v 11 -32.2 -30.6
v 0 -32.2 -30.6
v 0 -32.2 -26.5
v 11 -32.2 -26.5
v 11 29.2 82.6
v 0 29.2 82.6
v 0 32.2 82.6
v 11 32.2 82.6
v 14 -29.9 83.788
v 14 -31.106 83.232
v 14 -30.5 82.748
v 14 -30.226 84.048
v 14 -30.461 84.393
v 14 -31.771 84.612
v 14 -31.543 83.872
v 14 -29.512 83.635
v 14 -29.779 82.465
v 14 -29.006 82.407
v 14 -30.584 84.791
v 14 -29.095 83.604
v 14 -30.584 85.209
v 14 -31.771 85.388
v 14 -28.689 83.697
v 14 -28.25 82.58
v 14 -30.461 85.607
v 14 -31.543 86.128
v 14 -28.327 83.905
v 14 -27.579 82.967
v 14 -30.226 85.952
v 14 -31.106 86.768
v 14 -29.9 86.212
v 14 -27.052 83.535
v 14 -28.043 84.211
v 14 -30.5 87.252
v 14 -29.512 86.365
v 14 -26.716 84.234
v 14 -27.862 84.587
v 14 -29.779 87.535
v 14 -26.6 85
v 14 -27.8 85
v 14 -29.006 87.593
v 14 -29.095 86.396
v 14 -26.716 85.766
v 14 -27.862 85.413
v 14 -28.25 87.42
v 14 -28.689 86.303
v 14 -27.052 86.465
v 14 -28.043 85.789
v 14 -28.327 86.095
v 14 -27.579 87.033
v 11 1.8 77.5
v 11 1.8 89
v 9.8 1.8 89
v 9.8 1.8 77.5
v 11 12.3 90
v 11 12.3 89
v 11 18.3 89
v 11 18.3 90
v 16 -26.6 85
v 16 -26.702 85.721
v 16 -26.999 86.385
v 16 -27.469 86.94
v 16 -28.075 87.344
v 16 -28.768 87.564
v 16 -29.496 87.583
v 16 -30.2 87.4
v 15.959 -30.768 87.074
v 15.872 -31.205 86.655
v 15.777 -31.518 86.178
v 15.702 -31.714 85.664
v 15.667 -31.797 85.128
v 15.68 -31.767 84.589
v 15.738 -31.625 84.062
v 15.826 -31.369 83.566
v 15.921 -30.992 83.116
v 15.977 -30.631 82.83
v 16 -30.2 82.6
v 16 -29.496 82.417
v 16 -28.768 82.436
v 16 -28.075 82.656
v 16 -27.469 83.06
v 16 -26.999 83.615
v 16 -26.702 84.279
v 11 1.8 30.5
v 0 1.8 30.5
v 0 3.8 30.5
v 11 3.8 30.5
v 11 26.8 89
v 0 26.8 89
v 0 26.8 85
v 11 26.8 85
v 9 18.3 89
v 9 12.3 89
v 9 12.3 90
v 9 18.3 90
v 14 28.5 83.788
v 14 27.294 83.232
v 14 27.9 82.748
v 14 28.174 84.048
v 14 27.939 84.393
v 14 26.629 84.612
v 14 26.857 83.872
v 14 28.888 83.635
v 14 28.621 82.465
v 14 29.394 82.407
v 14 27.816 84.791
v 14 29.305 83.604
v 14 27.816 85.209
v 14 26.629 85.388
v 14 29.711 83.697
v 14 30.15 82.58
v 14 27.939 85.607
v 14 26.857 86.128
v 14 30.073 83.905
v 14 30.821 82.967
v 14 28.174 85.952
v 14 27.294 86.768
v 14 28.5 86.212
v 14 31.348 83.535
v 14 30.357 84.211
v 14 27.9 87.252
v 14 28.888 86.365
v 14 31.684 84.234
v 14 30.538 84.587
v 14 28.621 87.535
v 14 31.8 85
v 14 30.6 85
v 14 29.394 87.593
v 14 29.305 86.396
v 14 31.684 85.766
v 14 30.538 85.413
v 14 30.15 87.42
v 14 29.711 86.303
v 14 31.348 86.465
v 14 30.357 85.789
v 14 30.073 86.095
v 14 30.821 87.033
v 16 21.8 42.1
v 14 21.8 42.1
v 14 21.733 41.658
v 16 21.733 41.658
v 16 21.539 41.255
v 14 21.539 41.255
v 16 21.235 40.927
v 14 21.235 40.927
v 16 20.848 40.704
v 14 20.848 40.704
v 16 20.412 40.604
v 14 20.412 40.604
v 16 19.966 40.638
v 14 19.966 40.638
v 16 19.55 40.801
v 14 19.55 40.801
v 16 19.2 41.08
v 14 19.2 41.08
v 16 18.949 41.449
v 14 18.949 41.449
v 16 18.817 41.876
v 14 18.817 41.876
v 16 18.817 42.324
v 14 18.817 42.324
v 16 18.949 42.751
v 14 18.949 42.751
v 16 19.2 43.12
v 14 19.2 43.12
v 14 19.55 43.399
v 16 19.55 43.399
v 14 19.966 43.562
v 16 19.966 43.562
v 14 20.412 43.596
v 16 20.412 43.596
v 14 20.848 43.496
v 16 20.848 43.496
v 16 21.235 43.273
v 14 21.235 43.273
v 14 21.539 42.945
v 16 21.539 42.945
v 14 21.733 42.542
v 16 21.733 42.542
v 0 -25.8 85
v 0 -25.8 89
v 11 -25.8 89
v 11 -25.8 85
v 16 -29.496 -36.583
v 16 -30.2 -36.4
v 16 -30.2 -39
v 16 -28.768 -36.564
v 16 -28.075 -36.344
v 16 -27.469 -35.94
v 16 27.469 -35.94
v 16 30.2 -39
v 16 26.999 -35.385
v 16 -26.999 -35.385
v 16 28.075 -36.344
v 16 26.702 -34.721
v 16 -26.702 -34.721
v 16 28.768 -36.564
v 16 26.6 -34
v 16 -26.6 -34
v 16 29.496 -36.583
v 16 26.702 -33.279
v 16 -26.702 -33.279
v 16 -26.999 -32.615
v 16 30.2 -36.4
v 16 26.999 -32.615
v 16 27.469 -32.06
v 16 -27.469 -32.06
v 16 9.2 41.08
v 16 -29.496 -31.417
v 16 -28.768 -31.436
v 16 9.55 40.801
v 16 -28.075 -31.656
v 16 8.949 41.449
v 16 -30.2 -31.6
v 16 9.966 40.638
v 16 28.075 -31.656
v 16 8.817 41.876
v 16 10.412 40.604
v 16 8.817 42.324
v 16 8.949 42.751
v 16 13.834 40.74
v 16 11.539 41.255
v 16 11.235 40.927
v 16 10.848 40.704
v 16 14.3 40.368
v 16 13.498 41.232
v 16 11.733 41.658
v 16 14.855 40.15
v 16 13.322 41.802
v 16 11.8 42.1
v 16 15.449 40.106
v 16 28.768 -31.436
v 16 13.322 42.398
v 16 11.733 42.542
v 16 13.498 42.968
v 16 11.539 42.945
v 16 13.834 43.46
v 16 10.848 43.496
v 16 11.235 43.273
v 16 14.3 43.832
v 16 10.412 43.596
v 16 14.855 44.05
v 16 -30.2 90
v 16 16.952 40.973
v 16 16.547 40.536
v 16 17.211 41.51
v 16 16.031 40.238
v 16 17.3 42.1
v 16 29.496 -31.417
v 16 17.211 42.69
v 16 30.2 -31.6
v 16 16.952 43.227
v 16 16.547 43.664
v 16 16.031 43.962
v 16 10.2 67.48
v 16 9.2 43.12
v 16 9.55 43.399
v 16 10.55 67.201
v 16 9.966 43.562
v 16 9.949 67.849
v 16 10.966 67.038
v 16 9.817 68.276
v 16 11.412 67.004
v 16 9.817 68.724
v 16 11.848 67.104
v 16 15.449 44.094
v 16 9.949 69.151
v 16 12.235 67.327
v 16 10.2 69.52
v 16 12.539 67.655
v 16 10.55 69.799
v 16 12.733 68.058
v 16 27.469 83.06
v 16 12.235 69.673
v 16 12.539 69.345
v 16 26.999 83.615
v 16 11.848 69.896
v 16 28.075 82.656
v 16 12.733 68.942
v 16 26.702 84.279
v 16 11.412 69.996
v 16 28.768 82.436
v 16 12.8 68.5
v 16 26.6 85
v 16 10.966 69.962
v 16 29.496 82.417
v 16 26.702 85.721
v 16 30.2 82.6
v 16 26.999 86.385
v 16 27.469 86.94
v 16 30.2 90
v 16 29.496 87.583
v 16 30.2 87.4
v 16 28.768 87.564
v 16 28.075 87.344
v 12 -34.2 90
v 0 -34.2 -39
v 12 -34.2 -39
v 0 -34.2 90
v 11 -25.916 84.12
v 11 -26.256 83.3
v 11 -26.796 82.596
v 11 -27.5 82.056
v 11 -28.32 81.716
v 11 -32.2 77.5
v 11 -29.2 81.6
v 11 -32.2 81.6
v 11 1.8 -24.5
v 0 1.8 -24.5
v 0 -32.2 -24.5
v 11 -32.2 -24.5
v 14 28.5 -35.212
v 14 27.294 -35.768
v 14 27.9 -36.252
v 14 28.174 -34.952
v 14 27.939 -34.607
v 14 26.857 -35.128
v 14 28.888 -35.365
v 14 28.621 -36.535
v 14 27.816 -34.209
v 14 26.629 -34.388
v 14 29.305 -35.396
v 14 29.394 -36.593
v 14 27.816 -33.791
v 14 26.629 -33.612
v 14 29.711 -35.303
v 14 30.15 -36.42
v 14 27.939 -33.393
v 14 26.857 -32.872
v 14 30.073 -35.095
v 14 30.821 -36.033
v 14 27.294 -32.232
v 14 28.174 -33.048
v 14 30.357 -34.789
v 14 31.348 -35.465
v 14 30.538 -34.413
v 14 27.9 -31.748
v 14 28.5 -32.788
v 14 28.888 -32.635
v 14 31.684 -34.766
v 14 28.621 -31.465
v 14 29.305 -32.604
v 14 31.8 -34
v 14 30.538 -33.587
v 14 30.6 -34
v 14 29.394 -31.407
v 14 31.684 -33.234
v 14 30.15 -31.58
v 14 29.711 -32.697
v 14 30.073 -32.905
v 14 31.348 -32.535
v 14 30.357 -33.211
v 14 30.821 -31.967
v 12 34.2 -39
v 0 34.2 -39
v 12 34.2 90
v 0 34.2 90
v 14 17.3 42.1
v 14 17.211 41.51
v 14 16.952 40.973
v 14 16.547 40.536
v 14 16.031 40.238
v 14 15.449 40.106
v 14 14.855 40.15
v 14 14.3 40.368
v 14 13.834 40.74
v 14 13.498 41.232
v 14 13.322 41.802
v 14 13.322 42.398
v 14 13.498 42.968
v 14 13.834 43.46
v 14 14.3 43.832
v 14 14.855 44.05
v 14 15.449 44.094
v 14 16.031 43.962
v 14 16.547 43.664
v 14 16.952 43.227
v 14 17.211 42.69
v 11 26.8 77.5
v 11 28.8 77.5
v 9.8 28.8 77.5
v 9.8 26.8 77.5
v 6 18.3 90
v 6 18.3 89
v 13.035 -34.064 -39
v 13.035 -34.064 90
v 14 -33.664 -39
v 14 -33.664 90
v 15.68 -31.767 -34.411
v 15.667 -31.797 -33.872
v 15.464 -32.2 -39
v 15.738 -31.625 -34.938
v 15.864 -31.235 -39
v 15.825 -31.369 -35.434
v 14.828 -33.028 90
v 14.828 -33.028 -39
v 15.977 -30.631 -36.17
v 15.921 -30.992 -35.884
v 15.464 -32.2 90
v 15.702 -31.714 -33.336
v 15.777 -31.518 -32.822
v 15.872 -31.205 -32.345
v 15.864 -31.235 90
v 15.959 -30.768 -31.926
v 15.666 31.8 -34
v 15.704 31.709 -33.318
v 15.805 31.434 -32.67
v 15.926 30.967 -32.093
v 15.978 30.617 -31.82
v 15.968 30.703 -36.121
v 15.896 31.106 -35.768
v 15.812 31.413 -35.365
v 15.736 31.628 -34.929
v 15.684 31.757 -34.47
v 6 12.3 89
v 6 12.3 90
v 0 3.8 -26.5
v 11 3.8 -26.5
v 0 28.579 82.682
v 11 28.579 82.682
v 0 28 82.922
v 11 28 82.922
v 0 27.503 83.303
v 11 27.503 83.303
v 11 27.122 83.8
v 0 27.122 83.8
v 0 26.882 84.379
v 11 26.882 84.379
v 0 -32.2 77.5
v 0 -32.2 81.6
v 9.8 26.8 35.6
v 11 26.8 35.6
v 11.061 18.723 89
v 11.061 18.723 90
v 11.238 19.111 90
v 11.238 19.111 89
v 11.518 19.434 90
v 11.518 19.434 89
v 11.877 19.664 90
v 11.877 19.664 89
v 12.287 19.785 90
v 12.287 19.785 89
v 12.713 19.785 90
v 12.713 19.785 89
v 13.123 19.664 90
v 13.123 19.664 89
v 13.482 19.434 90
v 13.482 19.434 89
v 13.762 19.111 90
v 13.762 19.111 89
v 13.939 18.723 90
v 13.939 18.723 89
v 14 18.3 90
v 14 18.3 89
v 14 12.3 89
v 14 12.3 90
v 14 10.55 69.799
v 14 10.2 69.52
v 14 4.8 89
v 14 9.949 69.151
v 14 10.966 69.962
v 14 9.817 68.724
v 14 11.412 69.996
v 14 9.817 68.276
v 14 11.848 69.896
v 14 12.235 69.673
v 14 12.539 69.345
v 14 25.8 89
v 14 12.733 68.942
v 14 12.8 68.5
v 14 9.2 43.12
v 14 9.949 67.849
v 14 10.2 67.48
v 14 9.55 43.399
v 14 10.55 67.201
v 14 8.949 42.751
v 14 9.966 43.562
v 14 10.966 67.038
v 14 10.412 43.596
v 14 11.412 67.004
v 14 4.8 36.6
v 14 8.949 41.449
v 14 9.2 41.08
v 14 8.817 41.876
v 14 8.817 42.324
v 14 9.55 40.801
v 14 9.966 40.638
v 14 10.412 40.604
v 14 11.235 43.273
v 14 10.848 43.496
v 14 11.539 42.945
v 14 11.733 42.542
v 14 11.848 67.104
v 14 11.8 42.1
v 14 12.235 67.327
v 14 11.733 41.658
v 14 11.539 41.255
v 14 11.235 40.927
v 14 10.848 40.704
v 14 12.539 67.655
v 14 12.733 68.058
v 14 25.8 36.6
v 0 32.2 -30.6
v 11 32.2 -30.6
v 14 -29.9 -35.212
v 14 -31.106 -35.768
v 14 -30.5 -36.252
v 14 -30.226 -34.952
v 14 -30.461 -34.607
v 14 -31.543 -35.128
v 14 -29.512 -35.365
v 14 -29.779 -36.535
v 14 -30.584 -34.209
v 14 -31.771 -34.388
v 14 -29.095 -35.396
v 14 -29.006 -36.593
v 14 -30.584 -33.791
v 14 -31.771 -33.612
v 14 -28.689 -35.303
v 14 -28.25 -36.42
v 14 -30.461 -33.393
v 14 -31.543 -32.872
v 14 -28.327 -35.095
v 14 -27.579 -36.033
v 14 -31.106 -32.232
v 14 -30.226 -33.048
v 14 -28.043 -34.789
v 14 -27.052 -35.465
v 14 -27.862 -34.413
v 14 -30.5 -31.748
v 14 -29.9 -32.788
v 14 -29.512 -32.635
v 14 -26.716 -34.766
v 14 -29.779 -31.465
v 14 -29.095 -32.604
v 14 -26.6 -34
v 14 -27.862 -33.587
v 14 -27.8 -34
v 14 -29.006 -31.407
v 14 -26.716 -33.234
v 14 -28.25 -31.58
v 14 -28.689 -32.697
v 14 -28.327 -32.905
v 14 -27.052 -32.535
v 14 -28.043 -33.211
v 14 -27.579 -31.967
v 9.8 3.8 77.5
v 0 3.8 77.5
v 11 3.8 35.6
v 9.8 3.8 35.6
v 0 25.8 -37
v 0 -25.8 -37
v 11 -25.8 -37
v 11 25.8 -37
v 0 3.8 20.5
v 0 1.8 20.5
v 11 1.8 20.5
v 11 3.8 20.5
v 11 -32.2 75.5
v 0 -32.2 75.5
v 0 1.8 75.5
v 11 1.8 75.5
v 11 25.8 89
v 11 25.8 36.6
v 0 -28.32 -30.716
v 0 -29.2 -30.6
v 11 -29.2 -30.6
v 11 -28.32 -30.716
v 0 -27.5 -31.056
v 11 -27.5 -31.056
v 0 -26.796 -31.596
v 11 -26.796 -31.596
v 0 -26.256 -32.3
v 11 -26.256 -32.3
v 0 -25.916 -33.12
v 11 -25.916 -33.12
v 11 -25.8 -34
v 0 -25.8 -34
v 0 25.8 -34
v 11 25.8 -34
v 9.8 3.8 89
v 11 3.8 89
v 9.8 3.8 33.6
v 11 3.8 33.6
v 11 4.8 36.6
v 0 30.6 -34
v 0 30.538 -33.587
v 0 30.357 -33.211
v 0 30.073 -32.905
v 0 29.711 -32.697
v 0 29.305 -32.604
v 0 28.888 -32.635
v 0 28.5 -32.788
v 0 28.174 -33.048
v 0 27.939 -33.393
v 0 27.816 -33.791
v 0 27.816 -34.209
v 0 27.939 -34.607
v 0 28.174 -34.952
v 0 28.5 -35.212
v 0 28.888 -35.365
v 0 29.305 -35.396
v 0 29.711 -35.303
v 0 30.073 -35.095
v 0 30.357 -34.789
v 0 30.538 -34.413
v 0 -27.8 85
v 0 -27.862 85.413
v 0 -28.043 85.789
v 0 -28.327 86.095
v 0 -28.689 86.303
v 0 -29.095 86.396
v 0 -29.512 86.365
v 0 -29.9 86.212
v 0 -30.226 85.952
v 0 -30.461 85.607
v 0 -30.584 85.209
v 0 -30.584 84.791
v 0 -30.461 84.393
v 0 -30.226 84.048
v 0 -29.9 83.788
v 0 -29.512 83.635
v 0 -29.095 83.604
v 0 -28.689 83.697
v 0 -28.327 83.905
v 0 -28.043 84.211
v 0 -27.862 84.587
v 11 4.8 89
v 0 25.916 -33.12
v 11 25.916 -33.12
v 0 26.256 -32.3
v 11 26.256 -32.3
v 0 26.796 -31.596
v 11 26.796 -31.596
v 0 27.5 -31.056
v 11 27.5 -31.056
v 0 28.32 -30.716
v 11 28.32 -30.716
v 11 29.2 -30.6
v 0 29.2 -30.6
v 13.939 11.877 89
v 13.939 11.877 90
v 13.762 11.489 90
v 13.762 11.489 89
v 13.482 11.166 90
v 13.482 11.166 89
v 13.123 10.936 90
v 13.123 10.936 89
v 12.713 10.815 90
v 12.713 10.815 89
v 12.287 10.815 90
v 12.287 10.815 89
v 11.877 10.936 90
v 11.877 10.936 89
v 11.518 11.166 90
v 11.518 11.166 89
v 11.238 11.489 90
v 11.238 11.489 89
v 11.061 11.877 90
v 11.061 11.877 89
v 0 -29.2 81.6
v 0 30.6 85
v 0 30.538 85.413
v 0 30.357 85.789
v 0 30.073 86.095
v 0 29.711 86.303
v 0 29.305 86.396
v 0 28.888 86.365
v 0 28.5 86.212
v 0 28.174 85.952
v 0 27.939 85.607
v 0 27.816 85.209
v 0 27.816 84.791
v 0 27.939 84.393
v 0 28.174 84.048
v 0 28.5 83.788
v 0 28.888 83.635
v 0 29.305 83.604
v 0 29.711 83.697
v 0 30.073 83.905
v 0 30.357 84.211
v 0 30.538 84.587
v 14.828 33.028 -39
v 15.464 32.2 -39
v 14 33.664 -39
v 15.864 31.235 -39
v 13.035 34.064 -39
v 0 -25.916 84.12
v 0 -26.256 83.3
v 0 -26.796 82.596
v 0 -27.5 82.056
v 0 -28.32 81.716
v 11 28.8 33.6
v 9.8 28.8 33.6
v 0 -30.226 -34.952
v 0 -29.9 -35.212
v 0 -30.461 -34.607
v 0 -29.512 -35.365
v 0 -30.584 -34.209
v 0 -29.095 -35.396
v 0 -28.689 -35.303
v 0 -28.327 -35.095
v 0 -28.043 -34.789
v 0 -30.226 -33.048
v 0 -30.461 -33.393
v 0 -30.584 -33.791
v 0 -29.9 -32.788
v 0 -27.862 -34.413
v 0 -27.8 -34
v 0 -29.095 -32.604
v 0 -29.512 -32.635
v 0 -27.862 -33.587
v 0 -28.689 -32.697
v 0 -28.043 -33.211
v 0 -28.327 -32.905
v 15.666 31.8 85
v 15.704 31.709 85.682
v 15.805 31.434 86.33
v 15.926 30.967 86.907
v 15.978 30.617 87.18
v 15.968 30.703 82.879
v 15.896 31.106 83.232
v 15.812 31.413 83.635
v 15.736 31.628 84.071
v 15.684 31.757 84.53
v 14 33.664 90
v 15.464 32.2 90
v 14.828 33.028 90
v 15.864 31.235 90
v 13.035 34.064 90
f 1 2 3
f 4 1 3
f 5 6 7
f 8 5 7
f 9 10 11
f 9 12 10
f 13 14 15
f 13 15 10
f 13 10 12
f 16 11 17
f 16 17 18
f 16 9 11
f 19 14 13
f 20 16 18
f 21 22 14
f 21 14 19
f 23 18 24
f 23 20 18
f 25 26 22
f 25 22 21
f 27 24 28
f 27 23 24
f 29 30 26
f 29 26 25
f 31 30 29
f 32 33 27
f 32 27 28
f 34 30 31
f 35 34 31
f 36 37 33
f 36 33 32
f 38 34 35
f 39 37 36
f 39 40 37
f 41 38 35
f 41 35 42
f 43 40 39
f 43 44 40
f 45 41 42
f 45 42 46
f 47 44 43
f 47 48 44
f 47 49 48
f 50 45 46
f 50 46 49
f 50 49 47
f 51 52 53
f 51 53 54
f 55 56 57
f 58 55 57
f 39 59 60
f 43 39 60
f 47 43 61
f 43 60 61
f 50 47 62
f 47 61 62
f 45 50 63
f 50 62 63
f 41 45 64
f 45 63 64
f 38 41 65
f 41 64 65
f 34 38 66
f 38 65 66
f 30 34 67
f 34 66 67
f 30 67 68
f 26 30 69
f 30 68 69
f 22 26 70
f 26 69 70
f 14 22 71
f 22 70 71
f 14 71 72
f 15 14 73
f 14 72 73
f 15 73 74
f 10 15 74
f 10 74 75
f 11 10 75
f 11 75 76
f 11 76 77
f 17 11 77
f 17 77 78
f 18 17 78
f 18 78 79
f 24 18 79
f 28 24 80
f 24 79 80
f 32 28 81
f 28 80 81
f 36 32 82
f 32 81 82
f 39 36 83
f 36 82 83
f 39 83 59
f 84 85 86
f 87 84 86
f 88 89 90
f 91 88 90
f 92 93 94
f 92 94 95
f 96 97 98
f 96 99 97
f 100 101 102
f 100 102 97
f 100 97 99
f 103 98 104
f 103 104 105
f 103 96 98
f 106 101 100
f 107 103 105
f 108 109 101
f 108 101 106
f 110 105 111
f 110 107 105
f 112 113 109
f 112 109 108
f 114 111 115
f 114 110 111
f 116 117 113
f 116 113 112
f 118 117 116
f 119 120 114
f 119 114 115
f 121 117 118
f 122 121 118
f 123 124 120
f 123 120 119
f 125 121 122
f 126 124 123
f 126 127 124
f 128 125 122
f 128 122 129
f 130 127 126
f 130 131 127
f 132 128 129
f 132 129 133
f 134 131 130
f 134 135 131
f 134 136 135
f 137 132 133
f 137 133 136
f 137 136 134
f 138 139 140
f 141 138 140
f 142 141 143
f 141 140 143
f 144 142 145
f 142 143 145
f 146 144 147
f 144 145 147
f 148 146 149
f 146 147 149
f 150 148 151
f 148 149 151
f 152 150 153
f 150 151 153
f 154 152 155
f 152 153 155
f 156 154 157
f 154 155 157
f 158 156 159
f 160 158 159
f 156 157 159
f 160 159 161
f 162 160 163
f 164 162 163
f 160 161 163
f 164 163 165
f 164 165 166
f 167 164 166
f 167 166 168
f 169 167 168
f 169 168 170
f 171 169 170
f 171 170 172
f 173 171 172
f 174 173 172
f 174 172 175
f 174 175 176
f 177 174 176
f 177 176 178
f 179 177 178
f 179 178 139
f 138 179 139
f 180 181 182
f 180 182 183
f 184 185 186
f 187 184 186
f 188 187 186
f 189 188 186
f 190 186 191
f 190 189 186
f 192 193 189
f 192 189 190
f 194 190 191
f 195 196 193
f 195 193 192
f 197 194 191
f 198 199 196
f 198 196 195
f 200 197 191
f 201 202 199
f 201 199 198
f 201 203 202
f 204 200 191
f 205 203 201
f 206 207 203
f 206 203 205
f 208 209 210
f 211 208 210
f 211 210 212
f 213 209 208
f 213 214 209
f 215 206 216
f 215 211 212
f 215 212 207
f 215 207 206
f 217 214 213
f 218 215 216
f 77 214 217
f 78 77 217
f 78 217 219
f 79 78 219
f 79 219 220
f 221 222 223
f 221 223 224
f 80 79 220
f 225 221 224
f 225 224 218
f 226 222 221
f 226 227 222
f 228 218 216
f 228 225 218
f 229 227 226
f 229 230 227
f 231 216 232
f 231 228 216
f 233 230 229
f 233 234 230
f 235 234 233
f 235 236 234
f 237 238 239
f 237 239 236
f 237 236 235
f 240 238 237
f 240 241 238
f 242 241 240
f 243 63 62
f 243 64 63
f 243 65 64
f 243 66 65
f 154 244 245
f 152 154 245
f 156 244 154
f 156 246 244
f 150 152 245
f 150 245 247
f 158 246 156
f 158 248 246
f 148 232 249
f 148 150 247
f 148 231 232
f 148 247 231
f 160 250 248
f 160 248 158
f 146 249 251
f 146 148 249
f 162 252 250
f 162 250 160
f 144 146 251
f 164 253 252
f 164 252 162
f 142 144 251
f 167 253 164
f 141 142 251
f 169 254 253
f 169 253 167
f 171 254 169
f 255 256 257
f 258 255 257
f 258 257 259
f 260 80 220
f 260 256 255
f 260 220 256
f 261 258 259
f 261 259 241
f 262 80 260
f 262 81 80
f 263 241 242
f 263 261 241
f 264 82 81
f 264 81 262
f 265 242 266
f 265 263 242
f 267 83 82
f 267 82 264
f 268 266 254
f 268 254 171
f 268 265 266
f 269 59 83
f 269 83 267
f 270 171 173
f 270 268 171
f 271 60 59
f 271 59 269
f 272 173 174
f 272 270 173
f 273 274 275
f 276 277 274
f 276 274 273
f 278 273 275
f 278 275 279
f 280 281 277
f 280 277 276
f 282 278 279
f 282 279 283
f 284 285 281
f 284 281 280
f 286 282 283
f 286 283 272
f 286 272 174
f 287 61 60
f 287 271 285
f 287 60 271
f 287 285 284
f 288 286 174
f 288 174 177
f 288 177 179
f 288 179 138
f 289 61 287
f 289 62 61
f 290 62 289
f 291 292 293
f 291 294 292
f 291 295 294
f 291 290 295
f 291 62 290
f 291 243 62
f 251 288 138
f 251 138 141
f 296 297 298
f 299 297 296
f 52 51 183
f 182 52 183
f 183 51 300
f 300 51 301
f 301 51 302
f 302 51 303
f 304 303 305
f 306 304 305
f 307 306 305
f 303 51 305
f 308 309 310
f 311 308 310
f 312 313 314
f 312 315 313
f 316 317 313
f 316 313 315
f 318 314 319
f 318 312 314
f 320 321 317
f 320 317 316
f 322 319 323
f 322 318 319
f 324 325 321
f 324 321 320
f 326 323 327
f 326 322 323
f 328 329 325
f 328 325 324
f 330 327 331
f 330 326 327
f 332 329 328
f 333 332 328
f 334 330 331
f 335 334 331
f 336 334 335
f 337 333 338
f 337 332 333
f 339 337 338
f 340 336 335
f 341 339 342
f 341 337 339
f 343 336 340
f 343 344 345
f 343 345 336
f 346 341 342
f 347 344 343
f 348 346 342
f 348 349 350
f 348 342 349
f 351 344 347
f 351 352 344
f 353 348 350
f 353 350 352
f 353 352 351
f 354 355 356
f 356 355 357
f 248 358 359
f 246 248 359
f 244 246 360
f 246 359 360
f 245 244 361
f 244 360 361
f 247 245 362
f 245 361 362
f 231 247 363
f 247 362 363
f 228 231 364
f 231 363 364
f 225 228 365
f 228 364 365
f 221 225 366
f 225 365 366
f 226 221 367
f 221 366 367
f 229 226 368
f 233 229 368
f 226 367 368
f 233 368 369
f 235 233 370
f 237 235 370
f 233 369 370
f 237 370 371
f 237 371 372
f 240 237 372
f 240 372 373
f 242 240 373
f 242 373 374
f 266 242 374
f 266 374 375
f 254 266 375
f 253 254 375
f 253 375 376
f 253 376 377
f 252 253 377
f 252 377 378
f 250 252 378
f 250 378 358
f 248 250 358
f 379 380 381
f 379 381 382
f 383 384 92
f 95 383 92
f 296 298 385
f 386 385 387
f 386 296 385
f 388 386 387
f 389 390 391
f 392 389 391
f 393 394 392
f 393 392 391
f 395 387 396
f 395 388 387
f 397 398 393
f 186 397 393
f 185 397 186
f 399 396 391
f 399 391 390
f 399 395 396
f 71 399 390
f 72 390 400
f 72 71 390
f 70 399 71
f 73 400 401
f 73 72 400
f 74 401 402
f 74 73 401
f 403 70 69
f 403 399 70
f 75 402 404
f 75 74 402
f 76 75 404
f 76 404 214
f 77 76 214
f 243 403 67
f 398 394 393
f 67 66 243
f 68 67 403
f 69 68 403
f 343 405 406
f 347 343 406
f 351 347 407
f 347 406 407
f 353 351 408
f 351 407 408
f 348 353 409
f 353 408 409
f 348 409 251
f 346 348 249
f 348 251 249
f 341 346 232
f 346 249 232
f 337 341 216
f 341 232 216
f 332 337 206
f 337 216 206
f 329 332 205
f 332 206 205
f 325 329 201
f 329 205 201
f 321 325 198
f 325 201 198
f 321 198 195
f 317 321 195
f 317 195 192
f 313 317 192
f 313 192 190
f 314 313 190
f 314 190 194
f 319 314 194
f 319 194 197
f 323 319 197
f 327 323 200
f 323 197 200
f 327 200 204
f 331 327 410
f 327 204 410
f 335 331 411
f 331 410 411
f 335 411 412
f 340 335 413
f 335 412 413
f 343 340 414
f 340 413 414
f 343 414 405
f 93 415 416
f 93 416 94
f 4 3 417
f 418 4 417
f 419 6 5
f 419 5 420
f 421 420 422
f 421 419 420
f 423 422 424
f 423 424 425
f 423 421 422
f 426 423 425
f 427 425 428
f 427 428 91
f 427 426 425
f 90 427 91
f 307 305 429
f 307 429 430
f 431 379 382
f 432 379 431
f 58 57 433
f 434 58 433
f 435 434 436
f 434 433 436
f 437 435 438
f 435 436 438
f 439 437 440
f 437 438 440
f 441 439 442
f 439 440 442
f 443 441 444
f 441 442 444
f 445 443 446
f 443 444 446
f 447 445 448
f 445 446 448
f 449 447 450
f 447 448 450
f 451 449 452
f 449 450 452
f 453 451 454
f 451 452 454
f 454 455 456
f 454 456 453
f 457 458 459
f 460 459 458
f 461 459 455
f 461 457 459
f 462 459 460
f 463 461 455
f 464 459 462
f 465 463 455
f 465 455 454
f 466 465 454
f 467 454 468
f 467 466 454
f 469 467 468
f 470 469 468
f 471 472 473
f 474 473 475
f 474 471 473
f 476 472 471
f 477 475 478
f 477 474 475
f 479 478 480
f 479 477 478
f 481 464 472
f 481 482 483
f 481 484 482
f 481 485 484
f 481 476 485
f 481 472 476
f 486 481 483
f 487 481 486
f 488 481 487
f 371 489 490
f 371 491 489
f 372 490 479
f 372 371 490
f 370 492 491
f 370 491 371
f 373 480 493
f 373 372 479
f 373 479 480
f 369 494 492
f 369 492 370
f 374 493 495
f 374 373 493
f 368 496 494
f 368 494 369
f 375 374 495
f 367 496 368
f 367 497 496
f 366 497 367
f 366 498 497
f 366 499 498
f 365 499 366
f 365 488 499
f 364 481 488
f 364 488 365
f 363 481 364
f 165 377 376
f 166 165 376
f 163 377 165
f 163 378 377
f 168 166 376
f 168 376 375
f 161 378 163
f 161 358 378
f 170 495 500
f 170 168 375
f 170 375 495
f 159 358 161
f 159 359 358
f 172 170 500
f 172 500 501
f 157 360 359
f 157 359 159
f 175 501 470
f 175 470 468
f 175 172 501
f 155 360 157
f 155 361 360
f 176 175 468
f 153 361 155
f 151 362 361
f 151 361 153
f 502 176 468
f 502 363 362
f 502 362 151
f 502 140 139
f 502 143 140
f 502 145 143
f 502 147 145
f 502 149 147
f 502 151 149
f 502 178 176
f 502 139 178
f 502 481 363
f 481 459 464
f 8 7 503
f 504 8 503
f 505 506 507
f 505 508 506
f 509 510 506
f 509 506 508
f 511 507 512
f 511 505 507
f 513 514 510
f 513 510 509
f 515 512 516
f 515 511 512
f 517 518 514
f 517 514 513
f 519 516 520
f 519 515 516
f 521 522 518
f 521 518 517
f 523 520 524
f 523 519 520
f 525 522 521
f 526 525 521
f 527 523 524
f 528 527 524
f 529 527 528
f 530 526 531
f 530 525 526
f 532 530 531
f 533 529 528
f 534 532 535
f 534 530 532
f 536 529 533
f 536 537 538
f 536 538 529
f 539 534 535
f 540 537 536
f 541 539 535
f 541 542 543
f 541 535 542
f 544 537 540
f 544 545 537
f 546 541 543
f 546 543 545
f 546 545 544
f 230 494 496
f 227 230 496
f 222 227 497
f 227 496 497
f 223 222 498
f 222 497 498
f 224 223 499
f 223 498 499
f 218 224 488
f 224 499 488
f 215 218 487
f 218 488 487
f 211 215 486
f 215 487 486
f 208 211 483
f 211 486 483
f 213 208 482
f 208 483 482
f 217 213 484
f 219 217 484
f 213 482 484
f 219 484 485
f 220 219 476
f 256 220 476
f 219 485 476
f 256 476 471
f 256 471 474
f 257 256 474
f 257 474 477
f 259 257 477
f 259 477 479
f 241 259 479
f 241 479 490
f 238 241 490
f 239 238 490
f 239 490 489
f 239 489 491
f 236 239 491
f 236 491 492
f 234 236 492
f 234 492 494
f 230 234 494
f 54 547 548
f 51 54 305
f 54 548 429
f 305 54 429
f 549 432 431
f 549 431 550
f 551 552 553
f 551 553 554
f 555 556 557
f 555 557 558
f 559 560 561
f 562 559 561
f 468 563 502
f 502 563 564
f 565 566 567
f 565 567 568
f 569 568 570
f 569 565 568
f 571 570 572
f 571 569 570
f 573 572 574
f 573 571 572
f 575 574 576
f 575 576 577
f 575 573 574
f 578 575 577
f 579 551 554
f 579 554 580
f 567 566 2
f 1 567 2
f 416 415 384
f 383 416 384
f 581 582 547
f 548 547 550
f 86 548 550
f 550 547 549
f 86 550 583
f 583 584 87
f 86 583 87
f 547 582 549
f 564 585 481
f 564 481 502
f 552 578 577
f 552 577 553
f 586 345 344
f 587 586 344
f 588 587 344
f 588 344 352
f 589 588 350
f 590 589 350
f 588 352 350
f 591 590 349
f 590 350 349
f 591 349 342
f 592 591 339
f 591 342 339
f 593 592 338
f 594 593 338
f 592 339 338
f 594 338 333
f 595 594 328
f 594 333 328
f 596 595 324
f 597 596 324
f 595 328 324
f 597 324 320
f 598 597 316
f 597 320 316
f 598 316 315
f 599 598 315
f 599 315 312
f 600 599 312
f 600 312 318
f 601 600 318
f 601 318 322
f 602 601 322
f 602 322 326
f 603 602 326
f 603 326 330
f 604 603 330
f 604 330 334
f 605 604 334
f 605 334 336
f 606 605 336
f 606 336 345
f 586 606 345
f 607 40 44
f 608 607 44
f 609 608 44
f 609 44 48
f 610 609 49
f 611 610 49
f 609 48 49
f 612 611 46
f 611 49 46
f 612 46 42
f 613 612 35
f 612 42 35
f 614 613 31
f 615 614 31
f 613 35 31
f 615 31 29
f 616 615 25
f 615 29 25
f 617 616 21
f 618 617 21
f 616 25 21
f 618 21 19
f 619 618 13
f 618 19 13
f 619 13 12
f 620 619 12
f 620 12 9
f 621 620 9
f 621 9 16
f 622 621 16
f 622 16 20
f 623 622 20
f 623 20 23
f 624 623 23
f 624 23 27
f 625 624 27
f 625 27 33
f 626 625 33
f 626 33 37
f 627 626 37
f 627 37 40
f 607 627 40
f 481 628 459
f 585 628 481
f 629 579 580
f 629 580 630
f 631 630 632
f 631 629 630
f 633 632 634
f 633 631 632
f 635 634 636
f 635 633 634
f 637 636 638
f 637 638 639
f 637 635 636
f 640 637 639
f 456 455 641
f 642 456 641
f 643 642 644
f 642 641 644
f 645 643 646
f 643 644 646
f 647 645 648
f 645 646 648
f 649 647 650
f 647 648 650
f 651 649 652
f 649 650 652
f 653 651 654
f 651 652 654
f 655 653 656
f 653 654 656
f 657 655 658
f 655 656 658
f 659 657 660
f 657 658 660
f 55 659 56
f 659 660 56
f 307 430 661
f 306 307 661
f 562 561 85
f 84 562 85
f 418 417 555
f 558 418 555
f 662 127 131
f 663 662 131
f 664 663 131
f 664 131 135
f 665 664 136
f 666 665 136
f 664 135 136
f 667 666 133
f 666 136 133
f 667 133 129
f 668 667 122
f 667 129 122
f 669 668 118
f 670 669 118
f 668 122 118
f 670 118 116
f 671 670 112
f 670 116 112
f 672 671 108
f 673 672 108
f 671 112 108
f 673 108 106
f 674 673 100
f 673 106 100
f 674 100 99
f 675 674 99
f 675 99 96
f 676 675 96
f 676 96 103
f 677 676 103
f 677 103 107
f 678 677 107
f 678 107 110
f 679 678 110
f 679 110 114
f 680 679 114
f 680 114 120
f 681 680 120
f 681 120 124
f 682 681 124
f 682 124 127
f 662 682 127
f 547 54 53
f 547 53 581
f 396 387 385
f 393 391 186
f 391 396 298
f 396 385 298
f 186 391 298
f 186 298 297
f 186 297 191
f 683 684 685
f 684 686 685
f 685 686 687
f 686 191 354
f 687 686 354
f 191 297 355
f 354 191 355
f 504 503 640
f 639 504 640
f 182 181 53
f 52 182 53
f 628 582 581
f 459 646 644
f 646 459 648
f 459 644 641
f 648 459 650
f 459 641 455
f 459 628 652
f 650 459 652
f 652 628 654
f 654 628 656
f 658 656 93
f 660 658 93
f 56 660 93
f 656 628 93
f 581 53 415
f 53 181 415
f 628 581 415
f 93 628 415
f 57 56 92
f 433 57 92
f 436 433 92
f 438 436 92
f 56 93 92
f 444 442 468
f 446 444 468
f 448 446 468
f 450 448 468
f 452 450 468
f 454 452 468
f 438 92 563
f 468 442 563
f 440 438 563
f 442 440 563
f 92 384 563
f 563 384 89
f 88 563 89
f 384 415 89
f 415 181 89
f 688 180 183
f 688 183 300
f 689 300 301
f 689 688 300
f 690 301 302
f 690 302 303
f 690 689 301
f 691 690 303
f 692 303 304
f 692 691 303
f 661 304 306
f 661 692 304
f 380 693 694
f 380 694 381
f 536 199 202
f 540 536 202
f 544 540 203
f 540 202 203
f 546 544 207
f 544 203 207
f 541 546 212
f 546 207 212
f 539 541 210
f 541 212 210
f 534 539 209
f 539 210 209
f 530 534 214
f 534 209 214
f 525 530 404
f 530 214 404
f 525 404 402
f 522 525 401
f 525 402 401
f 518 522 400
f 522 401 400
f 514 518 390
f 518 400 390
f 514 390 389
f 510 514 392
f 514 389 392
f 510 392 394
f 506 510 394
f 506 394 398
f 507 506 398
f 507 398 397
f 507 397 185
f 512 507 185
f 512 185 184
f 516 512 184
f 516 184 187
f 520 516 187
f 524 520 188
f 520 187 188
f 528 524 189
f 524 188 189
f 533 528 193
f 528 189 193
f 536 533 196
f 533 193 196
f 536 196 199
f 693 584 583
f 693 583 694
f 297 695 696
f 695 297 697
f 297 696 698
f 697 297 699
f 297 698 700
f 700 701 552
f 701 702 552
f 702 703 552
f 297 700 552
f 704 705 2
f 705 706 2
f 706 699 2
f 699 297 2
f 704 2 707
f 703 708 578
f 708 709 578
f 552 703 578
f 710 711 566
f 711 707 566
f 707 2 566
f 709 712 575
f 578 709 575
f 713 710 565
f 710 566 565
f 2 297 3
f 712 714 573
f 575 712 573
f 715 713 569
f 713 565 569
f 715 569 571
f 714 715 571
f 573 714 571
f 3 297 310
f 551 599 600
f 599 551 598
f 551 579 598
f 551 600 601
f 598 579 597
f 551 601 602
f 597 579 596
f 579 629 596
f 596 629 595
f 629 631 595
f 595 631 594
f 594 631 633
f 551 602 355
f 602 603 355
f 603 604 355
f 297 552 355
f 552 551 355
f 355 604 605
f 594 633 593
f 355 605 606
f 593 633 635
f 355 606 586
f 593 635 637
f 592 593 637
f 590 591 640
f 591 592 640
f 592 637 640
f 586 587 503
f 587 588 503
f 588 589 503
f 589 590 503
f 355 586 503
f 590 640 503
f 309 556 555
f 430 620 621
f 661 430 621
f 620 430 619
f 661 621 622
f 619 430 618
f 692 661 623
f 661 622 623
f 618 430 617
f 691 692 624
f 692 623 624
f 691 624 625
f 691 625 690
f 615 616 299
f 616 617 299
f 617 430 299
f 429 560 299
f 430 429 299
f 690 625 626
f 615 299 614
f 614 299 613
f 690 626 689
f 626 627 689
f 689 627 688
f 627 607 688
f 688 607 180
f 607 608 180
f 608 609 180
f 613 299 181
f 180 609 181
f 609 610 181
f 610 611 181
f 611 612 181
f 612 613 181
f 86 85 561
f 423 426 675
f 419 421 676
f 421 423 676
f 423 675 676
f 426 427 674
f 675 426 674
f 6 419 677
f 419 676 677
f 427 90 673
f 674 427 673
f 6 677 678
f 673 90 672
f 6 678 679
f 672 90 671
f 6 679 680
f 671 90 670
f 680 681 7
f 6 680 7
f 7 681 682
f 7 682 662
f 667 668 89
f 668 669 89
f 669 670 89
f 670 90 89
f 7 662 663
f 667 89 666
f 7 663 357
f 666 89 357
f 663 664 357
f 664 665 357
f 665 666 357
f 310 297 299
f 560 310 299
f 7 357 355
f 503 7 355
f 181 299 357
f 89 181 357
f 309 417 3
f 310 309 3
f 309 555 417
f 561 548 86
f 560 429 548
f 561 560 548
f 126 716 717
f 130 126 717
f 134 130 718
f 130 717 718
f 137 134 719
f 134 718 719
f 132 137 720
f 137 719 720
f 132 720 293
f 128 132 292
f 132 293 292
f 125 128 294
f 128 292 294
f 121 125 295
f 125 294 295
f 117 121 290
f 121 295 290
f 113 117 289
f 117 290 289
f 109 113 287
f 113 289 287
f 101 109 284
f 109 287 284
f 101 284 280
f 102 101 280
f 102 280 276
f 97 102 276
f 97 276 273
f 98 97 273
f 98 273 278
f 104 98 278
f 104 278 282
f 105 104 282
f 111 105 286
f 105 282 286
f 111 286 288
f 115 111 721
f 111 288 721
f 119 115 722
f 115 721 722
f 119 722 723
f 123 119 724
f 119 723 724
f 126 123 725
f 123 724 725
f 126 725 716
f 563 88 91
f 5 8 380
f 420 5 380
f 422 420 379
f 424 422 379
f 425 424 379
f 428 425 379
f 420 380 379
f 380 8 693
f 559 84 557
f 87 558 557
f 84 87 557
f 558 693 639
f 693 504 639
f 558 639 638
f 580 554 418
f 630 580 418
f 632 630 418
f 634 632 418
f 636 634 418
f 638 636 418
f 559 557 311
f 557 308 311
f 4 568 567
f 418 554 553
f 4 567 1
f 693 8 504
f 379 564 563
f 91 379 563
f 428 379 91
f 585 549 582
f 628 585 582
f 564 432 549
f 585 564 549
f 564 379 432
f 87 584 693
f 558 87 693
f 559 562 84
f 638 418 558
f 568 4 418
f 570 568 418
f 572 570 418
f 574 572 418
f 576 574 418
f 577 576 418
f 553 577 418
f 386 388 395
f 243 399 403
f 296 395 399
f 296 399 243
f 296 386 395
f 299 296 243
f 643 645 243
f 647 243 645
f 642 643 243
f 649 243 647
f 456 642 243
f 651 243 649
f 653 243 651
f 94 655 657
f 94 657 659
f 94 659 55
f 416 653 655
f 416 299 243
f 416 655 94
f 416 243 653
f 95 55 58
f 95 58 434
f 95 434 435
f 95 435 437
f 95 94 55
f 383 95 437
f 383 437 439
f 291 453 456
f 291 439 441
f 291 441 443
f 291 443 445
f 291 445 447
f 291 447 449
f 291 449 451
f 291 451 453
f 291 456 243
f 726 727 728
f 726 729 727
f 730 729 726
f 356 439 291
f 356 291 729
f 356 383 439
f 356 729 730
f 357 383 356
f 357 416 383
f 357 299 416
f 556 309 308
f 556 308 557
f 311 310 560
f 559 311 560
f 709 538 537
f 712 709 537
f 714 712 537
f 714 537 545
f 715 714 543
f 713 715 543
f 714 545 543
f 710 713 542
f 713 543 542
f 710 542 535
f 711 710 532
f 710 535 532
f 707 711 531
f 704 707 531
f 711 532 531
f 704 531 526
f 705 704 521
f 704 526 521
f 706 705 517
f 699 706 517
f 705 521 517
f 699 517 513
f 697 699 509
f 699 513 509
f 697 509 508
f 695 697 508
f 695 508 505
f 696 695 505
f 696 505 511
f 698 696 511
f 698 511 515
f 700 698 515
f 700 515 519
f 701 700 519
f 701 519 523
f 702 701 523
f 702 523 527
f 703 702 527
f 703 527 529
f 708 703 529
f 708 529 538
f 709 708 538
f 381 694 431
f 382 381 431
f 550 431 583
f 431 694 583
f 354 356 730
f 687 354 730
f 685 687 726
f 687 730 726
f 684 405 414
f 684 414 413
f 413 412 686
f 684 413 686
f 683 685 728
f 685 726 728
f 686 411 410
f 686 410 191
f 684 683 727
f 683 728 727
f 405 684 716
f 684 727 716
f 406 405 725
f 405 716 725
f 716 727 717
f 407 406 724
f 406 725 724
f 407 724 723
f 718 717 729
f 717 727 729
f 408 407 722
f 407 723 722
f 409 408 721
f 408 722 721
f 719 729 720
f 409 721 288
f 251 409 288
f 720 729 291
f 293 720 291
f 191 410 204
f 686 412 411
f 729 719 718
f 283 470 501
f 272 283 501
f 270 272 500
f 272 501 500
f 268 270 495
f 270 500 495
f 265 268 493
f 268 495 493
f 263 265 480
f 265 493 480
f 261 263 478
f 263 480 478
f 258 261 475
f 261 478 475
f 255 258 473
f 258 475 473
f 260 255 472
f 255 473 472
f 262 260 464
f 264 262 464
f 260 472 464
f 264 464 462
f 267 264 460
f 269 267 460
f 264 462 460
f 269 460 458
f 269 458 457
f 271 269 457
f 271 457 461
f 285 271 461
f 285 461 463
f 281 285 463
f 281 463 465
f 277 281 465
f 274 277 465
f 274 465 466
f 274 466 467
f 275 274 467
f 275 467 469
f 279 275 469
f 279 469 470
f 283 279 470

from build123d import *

# Parameters (mm, degrees)
SKETCH016_W     = 68.4
SKETCH016_H     = 129
PAD004_DEPTH    = 16
FILLET002_R     = 4
SKETCH017_R     = 1.4
POCKET016_DEPTH = 16
SKETCH018_R     = 2.6
POCKET017_DEPTH = 2
POCKET018_DEPTH = 11
SKETCH020_W     = 21
SKETCH020_H     = 52.4
POCKET019_DEPTH = 3
SKETCH021_W     = 6
SKETCH021_H     = 3
POCKET020_DEPTH = 1
SKETCH022_W     = 2
SKETCH022_H     = 11.5
PAD005_DEPTH    = 1.2
SKETCH023_R     = 2
SKETCH023_R_2   = 1.5
POCKET021_DEPTH = 5


with BuildPart() as part:
    # Sketch016 → Pad004 (new body)
    with BuildSketch(Plane.YZ):
        with Locations((0, 25.5)):
            Rectangle(SKETCH016_W, SKETCH016_H)
    extrude(amount=PAD004_DEPTH)

    # Fillet002
    fillet002_edges = [part.edges().sort_by_distance(p)[0] for p in [
        (16, -34.2, 25.5),
        (16, 34.2, 25.5),
    ]]
    fillet(fillet002_edges, radius=FILLET002_R)

    # Sketch017 (on Face8 of Fillet002) → Pocket016 (cut)
    with BuildSketch(Plane.YZ.offset(16)):
        with Locations((-29.2, 85)):
            Circle(SKETCH017_R)
        with Locations((29.2, 85)):
            Circle(SKETCH017_R)
        with Locations((29.2, -34)):
            Circle(SKETCH017_R)
        with Locations((-29.2, -34)):
            Circle(SKETCH017_R)
    extrude(amount=-POCKET016_DEPTH, mode=Mode.SUBTRACT)

    # Sketch018 (on Face8 of Pocket016) → Pocket017 (cut)
    with BuildSketch(Plane.YZ.offset(16)):
        with Locations((-29.2, 85)):
            Circle(SKETCH018_R)
        with Locations((29.2, 85)):
            Circle(SKETCH018_R)
        with Locations((29.2, -34)):
            Circle(SKETCH018_R)
        with Locations((-29.2, -34)):
            Circle(SKETCH018_R)
    extrude(amount=-POCKET017_DEPTH, mode=Mode.SUBTRACT)

    # Sketch019 (on Face4 of Pocket017) → Pocket018 (cut)
    with BuildSketch(Plane(origin=(0, 0, 0), x_dir=(0, 1, 0), z_dir=(-1, 0, 0))):
        with BuildLine():
            ThreePointArc((25.8, 34), (26.795837, 31.595837), (29.2, 30.6))
            Line((32.2, 30.6), (29.2, 30.6))
            Line((32.2, -82.6), (32.2, 30.6))
            Line((29.2, -82.6), (32.2, -82.6))
            ThreePointArc((29.2, -82.6), (27.502944, -83.302944), (26.8, -85))
            Line((26.8, -89), (26.8, -85))
            Line((-25.8, -89), (26.8, -89))
            Line((-25.8, -89), (-25.8, -85))
            ThreePointArc((-25.8, -85), (-26.795837, -82.595837), (-29.2, -81.6))
            Line((-32.2, -81.6), (-29.2, -81.6))
            Line((-32.2, -77.5), (-32.2, -81.6))
            Line((3.8, -77.5), (-32.2, -77.5))
            Line((3.8, -30.5), (3.8, -77.5))
            Line((1.8, -30.5), (3.8, -30.5))
            Line((1.8, -75.5), (1.8, -30.5))
            Line((-32.2, -75.5), (1.8, -75.5))
            Line((-32.2, 24.5), (-32.2, -75.5))
            Line((1.8, 24.5), (-32.2, 24.5))
            Line((1.8, 24.5), (1.8, -20.5))
            Line((1.8, -20.5), (3.8, -20.5))
            Line((3.8, 26.5), (3.8, -20.5))
            Line((-32.2, 26.5), (3.8, 26.5))
            Line((-32.2, 30.6), (-32.2, 26.5))
            Line((-29.2, 30.6), (-32.2, 30.6))
            ThreePointArc((-29.2, 30.6), (-26.795837, 31.595837), (-25.8, 34))
            Line((-25.8, 34), (-25.8, 37))
            Line((-25.8, 37), (25.8, 37))
            Line((25.8, 37), (25.8, 34))
        make_face()
    extrude(amount=-POCKET018_DEPTH, mode=Mode.SUBTRACT)

    # Sketch020 (on Face49 of Pocket018) → Pocket019 (cut)
    with BuildSketch(Plane(origin=(11, 0, 0), x_dir=(0, 1, 0), z_dir=(-1, 0, 0))):
        with Locations((15.3, -62.8)):
            Rectangle(SKETCH020_W, SKETCH020_H)
    extrude(amount=-POCKET019_DEPTH, mode=Mode.SUBTRACT)

    # Sketch021 (on Face50 of Pocket019) → Pocket020 (cut)
    with BuildSketch(Plane.YX.offset(-89)):
        with BuildLine():
            ThreePointArc((12.3, 14), (10.8, 12.5), (12.3, 11))
            Line((12.3, 11), (18.3, 11))
            ThreePointArc((18.3, 11), (19.8, 12.5), (18.3, 14))
            Line((12.3, 14), (18.3, 14))
        make_face()
        with Locations((15.3, 7.5)):
            Rectangle(SKETCH021_W, SKETCH021_H)
    extrude(amount=-POCKET020_DEPTH, mode=Mode.SUBTRACT)

    # Sketch022 (on Face60 of Pocket020) → Pad005 (join)
    with BuildSketch(Plane(origin=(11, 0, 0), x_dir=(0, 1, 0), z_dir=(-1, 0, 0))):
        with Locations((2.8, -83.25)):
            Rectangle(SKETCH022_W, SKETCH022_H)
        Polygon((1.8, -33.6), (28.8, -33.6), (28.8, -77.5), (26.8, -77.5), (26.8, -35.6), (1.8, -35.6), align=None)
    extrude(amount=PAD005_DEPTH)

    # Sketch023 (on Face55 of Pad005) → Pocket021 (cut)
    with BuildSketch(Plane(origin=(14, 0, 0), x_dir=(0, 1, 0), z_dir=(-1, 0, 0))):
        with Locations((15.3, -42.1)):
            Circle(SKETCH023_R)
        with Locations((10.3, -42.1)):
            Circle(SKETCH023_R_2)
        with Locations((20.3, -42.1)):
            Circle(SKETCH023_R_2)
        with Locations((11.3, -68.5)):
            Circle(SKETCH023_R_2)
    extrude(amount=-POCKET021_DEPTH, mode=Mode.SUBTRACT)


solid = part.part
